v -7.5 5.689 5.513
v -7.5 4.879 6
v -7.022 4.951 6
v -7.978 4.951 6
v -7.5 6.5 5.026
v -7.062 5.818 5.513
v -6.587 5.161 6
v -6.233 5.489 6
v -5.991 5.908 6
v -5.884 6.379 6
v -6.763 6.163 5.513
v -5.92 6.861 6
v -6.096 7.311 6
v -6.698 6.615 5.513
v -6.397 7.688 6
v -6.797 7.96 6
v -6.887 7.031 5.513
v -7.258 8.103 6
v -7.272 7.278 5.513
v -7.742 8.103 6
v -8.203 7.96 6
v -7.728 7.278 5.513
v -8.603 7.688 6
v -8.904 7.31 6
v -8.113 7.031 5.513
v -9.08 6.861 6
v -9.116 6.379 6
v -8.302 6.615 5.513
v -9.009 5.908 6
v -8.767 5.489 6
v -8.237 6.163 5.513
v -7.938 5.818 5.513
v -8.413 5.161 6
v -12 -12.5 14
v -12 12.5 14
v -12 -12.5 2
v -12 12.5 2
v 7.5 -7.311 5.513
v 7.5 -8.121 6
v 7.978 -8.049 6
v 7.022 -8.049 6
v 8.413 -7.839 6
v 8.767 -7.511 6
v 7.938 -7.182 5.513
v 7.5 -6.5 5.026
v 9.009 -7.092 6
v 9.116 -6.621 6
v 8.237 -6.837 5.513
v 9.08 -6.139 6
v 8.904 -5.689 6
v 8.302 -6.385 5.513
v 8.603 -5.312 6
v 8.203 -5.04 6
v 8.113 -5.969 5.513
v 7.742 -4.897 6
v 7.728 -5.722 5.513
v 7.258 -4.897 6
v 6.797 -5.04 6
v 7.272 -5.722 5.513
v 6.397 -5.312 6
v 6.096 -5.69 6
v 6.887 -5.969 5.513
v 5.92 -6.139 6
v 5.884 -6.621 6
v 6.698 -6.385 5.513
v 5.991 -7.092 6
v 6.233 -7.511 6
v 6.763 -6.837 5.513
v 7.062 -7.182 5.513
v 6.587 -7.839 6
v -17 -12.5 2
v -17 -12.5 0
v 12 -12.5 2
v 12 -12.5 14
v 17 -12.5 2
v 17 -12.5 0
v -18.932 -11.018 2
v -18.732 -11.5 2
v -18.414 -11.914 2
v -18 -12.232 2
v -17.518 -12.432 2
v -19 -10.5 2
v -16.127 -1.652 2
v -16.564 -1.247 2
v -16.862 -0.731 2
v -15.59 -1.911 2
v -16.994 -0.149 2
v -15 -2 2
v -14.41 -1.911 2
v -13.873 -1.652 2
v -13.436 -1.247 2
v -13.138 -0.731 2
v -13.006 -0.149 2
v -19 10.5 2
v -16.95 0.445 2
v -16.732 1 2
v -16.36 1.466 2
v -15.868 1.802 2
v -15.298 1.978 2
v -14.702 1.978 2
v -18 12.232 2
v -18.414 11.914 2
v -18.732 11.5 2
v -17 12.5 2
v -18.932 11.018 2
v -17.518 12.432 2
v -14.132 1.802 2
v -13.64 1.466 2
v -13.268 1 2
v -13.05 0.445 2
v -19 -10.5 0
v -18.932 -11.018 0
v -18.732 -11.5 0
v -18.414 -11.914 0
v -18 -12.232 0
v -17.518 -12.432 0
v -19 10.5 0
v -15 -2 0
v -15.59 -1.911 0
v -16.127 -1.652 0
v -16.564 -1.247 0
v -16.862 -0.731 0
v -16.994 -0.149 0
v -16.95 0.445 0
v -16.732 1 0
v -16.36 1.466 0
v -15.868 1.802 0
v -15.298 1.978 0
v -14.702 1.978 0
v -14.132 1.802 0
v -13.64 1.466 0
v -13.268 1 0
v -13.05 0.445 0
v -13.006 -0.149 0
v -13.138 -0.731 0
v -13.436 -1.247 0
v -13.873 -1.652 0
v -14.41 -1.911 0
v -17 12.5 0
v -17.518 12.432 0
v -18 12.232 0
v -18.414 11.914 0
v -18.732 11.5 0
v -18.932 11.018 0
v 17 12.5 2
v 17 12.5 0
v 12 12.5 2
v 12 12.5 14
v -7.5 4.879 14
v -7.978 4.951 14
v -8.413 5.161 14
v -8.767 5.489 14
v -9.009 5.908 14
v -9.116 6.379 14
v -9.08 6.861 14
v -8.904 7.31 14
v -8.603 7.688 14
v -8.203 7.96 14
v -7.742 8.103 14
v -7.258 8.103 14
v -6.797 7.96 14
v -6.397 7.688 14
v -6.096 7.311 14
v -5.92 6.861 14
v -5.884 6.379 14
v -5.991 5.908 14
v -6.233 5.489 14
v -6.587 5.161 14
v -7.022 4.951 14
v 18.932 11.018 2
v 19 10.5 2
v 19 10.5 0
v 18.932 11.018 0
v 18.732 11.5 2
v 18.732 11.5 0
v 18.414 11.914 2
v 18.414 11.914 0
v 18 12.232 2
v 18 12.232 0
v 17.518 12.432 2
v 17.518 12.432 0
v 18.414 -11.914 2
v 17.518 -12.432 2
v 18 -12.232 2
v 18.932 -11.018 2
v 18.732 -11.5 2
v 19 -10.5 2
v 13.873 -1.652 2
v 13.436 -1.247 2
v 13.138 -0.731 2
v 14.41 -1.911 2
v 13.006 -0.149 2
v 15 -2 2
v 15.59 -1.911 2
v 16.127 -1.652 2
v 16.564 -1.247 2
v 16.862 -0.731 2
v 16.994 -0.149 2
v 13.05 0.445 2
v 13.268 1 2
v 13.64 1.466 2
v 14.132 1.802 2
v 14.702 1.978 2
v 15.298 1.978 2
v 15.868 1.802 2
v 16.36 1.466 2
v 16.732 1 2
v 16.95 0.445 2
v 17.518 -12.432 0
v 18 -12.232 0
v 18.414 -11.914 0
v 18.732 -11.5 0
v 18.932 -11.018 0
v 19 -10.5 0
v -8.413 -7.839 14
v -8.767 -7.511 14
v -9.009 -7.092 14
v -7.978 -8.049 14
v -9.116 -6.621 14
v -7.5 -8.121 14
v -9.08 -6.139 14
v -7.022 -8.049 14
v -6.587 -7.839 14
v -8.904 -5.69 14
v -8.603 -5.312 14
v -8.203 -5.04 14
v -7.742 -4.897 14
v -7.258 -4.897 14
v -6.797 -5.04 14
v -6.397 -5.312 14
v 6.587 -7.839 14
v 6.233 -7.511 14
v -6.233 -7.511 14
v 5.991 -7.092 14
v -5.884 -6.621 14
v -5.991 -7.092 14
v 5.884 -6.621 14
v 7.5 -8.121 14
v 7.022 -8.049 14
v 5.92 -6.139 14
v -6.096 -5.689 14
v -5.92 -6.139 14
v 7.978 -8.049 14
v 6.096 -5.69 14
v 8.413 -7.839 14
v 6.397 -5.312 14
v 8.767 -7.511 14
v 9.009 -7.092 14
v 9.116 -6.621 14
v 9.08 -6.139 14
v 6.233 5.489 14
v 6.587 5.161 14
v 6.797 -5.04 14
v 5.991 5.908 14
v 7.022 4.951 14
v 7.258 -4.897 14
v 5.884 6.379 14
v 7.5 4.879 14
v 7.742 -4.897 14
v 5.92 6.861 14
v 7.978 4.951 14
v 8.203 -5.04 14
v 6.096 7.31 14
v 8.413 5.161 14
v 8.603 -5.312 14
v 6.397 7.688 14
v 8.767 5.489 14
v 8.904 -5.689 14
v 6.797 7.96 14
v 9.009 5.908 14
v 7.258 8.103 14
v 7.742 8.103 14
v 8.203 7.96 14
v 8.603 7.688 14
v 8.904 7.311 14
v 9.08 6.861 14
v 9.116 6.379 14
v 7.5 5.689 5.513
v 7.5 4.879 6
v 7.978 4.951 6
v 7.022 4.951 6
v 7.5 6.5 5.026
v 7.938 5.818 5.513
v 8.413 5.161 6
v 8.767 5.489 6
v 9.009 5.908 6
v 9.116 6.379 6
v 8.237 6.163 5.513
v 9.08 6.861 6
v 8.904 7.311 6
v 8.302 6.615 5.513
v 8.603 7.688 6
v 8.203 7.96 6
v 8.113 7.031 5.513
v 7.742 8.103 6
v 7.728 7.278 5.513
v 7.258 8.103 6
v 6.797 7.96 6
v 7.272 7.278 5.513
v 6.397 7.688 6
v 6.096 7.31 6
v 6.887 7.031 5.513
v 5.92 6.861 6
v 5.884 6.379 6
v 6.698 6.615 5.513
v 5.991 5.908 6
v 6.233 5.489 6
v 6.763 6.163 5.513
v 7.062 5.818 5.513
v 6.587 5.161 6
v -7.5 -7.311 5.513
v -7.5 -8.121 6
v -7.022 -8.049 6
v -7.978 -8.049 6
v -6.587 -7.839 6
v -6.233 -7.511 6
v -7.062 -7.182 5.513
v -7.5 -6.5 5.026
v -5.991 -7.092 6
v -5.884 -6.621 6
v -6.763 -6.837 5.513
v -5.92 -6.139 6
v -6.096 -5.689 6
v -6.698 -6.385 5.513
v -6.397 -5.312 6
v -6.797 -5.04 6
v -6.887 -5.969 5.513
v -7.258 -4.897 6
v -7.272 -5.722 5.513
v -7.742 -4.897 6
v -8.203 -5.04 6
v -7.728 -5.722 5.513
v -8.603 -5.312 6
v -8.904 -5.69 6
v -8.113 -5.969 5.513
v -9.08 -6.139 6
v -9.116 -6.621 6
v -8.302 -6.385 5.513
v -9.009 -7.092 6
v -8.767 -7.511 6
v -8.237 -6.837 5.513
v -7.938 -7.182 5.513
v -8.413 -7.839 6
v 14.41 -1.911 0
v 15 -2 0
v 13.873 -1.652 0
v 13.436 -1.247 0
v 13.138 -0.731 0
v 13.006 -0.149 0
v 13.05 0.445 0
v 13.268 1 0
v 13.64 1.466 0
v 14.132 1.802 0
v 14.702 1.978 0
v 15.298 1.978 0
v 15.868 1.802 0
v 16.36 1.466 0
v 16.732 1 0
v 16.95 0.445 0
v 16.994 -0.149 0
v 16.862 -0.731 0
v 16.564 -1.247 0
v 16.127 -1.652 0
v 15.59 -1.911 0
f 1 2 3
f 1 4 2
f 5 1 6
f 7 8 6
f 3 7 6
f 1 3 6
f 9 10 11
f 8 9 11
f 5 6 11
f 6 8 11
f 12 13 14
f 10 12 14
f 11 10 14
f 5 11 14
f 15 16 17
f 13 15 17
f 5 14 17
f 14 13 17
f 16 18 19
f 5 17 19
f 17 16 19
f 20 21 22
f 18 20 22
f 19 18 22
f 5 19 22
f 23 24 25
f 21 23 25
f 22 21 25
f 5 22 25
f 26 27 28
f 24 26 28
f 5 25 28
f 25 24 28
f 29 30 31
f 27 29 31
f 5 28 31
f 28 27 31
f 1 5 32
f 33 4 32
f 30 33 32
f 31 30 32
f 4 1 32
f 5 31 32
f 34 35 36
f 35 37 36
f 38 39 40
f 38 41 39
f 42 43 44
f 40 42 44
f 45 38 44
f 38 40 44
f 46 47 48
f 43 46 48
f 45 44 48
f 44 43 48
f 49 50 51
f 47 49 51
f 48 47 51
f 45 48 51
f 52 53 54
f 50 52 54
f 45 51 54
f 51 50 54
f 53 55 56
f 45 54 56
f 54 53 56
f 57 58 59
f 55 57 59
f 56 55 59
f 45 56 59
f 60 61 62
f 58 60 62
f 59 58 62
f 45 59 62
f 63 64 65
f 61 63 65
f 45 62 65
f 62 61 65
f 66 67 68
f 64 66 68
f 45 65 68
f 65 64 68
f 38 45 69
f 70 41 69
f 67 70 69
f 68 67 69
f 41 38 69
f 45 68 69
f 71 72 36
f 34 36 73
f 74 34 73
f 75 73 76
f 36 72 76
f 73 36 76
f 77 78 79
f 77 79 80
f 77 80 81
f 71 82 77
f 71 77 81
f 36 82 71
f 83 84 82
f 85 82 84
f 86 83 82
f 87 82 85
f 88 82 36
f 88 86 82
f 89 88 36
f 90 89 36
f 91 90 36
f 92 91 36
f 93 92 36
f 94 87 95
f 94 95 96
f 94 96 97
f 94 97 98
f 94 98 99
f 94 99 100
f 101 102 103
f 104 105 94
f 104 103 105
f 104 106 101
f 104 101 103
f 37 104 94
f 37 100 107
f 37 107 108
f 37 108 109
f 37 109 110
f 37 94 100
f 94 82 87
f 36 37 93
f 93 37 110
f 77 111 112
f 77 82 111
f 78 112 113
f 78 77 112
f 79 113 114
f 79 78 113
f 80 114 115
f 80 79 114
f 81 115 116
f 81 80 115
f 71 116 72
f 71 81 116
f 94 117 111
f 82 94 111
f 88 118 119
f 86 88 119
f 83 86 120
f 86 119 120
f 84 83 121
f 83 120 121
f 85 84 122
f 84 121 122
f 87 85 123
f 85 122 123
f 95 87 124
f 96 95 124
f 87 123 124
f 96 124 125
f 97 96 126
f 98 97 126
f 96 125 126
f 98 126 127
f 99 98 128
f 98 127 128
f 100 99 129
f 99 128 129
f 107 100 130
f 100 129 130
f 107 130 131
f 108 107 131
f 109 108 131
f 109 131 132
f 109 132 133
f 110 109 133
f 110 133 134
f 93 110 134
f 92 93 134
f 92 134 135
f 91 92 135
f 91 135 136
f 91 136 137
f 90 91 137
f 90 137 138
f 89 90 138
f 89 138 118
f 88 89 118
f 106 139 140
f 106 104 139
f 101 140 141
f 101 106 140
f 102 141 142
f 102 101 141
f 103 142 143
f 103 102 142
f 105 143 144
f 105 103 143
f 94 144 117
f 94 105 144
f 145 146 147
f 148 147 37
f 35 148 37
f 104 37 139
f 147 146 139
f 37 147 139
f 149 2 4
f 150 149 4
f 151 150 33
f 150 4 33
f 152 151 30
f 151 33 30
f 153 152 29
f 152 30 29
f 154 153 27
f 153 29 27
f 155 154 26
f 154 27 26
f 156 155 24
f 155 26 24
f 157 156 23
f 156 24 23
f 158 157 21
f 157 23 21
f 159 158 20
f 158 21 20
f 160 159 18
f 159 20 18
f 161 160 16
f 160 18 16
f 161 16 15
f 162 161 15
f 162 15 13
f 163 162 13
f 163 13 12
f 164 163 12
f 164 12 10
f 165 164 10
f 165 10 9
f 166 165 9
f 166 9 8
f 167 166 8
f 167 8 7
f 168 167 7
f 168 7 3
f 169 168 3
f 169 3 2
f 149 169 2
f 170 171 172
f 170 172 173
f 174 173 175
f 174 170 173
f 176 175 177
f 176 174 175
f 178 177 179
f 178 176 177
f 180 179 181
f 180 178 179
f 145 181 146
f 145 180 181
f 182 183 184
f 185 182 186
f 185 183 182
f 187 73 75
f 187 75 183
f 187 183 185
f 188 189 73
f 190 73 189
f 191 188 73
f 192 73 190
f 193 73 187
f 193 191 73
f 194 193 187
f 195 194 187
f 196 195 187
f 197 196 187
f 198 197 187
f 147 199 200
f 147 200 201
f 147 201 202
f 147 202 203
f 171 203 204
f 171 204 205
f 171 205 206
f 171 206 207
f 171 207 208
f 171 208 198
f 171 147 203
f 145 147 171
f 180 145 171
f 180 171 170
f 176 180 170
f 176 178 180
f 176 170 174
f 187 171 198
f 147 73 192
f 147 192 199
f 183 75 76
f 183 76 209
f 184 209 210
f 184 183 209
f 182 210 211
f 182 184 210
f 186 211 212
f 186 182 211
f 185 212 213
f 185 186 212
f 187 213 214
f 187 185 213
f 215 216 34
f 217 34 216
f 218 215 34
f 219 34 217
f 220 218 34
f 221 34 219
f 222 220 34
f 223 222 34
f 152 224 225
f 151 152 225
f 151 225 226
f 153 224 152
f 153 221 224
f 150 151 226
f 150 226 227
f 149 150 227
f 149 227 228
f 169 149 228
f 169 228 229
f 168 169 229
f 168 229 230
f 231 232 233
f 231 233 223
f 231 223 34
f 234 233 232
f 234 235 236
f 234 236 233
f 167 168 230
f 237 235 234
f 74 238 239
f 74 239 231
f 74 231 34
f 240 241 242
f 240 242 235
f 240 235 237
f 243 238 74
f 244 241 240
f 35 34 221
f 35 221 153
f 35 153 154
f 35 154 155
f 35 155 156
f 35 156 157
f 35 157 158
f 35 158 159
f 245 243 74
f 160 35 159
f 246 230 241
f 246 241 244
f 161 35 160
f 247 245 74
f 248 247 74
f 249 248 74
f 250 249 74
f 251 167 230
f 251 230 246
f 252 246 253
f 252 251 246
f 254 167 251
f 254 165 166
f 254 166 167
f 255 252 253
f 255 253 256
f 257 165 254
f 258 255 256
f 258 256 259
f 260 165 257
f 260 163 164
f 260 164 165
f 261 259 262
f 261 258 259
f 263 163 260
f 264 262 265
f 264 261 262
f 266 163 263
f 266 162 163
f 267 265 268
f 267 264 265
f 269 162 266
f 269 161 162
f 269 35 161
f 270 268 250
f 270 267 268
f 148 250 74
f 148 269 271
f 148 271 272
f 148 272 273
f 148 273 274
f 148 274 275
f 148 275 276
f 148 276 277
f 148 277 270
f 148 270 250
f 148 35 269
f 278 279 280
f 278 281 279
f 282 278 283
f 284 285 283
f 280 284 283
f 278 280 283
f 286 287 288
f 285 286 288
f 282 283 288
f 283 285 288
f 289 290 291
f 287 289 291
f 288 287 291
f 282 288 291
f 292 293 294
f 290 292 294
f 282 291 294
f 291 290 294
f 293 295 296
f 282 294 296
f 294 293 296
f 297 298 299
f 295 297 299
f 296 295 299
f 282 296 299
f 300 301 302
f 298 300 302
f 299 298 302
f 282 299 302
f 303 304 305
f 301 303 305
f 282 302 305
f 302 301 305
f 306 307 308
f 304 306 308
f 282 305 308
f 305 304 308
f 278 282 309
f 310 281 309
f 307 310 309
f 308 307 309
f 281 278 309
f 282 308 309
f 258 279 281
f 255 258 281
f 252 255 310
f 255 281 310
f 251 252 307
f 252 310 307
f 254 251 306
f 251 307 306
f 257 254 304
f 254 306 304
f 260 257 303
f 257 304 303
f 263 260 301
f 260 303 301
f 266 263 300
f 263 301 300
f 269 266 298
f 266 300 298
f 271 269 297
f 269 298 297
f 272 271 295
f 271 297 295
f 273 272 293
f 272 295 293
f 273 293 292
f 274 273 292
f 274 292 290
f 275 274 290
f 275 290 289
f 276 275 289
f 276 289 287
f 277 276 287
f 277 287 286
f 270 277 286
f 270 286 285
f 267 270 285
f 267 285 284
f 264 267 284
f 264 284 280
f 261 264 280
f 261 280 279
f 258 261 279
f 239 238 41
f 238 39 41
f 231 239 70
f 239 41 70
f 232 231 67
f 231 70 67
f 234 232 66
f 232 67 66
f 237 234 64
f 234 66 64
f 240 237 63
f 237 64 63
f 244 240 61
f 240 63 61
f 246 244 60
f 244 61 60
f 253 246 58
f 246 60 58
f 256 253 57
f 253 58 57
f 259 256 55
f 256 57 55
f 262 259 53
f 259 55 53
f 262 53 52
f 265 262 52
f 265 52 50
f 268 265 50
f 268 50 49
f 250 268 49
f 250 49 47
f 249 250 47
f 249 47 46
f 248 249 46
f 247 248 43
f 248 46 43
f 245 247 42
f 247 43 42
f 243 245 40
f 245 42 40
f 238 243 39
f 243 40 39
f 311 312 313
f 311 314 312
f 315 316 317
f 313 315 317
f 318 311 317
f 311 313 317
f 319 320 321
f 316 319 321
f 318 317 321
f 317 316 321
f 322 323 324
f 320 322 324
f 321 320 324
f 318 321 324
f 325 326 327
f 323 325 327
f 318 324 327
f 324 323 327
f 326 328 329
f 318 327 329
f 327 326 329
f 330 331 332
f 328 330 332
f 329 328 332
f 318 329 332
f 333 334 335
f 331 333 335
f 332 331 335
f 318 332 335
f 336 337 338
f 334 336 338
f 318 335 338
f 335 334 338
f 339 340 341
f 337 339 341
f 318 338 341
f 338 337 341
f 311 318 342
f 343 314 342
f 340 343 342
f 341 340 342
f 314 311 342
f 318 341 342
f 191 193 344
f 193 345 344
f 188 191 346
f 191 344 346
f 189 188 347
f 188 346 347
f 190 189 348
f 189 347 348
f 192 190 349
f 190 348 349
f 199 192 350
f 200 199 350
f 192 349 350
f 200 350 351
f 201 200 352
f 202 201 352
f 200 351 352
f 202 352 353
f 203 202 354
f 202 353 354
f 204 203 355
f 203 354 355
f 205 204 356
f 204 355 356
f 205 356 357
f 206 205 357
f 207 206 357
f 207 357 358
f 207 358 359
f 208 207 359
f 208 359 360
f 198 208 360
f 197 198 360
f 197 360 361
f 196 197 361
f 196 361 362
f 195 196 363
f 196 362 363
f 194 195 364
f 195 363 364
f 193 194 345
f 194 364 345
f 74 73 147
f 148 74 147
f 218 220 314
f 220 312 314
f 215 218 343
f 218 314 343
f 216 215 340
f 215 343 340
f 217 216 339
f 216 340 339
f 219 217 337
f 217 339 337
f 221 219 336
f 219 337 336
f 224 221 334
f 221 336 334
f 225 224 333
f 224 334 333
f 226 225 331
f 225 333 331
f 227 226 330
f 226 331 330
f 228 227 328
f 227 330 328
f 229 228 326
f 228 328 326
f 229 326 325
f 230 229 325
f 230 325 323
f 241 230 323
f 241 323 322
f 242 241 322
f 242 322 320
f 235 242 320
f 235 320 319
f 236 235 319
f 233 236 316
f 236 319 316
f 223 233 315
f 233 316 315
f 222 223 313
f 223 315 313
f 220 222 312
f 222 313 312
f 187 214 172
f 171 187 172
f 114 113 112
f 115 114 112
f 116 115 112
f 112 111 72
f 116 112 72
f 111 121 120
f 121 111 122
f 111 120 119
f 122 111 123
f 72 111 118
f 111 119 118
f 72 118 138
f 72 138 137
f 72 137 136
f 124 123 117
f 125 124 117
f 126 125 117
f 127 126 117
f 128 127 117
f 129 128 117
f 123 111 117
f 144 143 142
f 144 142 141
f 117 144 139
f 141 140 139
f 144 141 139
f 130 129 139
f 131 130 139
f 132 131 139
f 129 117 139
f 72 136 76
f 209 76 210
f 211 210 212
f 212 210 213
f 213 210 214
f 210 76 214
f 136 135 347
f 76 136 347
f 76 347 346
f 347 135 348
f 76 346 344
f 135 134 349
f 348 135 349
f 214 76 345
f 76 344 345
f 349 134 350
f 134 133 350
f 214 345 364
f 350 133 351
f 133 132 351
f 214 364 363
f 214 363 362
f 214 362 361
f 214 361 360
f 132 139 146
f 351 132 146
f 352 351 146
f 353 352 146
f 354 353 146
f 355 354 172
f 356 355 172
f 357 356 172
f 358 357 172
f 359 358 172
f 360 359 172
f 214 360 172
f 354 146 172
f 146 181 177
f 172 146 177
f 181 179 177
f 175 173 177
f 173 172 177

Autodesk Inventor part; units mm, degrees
ref_plane "YZ Plane" through (0, 0, 0) normal (1, 0, 0) x (0, 1, 0)
ref_plane "XZ Plane" through (0, 0, 0) normal (0, 1, 0) x (-1, 0, 0)
ref_plane "XY Plane" through (0, 0, 0) normal (0, 0, 1) x (1, 0, 0)
sketch "Sketch1" plane through (0, 0, 0) normal (0, 0, 1) x (1, 0, 0)
  line L0 (-19, -12.5) -> (19, -12.5)
  line L1 (19, -12.5) -> (19, 12.5)
  line L2 (19, 12.5) -> (-19, 12.5)
  line L3 (-19, 12.5) -> (-19, -12.5)
  line L4 (-19, -12.5) -> (19, 12.5) construction
  line L5 (19, -12.5) -> (-19, 12.5) construction
  point P0 (0, 0)
  dimension "d0" = 38
  dimension "d1" = 25
extrude "Extrusion1" add sketch "Sketch1" along normal blind 2
sketch "Sketch2" plane through (0, 0, 2) normal (0, 0, 1) x (1, 0, 0)
  line L0 (19, 12.5) -> (-19, 12.5) projected
  line L1 (-12, -12.5) -> (12, -12.5)
  line L2 (12, -12.5) -> (12, 12.5)
  line L3 (12, 12.5) -> (-12, 12.5)
  line L4 (-12, 12.5) -> (-12, -12.5)
  line L5 (-12, -12.5) -> (12, 12.5) construction
  line L6 (12, -12.5) -> (-12, 12.5) construction
  point P0 (0, 0)
  dimension "d4" = 24
extrude "Extrusion2" add sketch "Sketch2" along normal blind 12
sketch "Sketch3" plane through (0, 0, 2) normal (0, 0, 1) x (1, 0, 0)
  line L0 (-15, 0) -> (15, 0) construction
  point P0 (0, 0)
  point P1 (0, 0)
  dimension "d7" = 30
hole "Hole1" at (-15, 0, 2) at (15, 0, 2) direction (0, 0, -1) diameter 4 end through all
sketch "Sketch4" plane through (0, 0, 14) normal (0, 0, 1) x (1, 0, 0)
  line L0 (-7.5, -6.5) -> (7.5, -6.5) construction
  line L1 (7.5, -6.5) -> (7.5, 6.5) construction
  line L2 (7.5, 6.5) -> (-7.5, 6.5) construction
  line L3 (-7.5, 6.5) -> (-7.5, -6.5) construction
  line L4 (-7.5, -6.5) -> (7.5, 6.5) construction
  line L5 (7.5, -6.5) -> (-7.5, 6.5) construction
  point P0 (0, 0)
  dimension "d15" = 15
  dimension "d16" = 13
hole "Hole2" at (-7.5, 6.5, 14) at (7.5, 6.5, 14) at (7.5, -6.5, 14) at (-7.5, -6.5, 14) direction (0, 0, -1) diameter 3.242 depth 8 tip angle 118 thread size "M4x0.7" class "6H" standard "ISO Metric profile"
fillet "Fillet1" radius 2 4 edges at (-19, -12.5, 1) (19, -12.5, 1) (19, 12.5, 1) (-19, 12.5, 1)
properties part number "GT175DA120U"
